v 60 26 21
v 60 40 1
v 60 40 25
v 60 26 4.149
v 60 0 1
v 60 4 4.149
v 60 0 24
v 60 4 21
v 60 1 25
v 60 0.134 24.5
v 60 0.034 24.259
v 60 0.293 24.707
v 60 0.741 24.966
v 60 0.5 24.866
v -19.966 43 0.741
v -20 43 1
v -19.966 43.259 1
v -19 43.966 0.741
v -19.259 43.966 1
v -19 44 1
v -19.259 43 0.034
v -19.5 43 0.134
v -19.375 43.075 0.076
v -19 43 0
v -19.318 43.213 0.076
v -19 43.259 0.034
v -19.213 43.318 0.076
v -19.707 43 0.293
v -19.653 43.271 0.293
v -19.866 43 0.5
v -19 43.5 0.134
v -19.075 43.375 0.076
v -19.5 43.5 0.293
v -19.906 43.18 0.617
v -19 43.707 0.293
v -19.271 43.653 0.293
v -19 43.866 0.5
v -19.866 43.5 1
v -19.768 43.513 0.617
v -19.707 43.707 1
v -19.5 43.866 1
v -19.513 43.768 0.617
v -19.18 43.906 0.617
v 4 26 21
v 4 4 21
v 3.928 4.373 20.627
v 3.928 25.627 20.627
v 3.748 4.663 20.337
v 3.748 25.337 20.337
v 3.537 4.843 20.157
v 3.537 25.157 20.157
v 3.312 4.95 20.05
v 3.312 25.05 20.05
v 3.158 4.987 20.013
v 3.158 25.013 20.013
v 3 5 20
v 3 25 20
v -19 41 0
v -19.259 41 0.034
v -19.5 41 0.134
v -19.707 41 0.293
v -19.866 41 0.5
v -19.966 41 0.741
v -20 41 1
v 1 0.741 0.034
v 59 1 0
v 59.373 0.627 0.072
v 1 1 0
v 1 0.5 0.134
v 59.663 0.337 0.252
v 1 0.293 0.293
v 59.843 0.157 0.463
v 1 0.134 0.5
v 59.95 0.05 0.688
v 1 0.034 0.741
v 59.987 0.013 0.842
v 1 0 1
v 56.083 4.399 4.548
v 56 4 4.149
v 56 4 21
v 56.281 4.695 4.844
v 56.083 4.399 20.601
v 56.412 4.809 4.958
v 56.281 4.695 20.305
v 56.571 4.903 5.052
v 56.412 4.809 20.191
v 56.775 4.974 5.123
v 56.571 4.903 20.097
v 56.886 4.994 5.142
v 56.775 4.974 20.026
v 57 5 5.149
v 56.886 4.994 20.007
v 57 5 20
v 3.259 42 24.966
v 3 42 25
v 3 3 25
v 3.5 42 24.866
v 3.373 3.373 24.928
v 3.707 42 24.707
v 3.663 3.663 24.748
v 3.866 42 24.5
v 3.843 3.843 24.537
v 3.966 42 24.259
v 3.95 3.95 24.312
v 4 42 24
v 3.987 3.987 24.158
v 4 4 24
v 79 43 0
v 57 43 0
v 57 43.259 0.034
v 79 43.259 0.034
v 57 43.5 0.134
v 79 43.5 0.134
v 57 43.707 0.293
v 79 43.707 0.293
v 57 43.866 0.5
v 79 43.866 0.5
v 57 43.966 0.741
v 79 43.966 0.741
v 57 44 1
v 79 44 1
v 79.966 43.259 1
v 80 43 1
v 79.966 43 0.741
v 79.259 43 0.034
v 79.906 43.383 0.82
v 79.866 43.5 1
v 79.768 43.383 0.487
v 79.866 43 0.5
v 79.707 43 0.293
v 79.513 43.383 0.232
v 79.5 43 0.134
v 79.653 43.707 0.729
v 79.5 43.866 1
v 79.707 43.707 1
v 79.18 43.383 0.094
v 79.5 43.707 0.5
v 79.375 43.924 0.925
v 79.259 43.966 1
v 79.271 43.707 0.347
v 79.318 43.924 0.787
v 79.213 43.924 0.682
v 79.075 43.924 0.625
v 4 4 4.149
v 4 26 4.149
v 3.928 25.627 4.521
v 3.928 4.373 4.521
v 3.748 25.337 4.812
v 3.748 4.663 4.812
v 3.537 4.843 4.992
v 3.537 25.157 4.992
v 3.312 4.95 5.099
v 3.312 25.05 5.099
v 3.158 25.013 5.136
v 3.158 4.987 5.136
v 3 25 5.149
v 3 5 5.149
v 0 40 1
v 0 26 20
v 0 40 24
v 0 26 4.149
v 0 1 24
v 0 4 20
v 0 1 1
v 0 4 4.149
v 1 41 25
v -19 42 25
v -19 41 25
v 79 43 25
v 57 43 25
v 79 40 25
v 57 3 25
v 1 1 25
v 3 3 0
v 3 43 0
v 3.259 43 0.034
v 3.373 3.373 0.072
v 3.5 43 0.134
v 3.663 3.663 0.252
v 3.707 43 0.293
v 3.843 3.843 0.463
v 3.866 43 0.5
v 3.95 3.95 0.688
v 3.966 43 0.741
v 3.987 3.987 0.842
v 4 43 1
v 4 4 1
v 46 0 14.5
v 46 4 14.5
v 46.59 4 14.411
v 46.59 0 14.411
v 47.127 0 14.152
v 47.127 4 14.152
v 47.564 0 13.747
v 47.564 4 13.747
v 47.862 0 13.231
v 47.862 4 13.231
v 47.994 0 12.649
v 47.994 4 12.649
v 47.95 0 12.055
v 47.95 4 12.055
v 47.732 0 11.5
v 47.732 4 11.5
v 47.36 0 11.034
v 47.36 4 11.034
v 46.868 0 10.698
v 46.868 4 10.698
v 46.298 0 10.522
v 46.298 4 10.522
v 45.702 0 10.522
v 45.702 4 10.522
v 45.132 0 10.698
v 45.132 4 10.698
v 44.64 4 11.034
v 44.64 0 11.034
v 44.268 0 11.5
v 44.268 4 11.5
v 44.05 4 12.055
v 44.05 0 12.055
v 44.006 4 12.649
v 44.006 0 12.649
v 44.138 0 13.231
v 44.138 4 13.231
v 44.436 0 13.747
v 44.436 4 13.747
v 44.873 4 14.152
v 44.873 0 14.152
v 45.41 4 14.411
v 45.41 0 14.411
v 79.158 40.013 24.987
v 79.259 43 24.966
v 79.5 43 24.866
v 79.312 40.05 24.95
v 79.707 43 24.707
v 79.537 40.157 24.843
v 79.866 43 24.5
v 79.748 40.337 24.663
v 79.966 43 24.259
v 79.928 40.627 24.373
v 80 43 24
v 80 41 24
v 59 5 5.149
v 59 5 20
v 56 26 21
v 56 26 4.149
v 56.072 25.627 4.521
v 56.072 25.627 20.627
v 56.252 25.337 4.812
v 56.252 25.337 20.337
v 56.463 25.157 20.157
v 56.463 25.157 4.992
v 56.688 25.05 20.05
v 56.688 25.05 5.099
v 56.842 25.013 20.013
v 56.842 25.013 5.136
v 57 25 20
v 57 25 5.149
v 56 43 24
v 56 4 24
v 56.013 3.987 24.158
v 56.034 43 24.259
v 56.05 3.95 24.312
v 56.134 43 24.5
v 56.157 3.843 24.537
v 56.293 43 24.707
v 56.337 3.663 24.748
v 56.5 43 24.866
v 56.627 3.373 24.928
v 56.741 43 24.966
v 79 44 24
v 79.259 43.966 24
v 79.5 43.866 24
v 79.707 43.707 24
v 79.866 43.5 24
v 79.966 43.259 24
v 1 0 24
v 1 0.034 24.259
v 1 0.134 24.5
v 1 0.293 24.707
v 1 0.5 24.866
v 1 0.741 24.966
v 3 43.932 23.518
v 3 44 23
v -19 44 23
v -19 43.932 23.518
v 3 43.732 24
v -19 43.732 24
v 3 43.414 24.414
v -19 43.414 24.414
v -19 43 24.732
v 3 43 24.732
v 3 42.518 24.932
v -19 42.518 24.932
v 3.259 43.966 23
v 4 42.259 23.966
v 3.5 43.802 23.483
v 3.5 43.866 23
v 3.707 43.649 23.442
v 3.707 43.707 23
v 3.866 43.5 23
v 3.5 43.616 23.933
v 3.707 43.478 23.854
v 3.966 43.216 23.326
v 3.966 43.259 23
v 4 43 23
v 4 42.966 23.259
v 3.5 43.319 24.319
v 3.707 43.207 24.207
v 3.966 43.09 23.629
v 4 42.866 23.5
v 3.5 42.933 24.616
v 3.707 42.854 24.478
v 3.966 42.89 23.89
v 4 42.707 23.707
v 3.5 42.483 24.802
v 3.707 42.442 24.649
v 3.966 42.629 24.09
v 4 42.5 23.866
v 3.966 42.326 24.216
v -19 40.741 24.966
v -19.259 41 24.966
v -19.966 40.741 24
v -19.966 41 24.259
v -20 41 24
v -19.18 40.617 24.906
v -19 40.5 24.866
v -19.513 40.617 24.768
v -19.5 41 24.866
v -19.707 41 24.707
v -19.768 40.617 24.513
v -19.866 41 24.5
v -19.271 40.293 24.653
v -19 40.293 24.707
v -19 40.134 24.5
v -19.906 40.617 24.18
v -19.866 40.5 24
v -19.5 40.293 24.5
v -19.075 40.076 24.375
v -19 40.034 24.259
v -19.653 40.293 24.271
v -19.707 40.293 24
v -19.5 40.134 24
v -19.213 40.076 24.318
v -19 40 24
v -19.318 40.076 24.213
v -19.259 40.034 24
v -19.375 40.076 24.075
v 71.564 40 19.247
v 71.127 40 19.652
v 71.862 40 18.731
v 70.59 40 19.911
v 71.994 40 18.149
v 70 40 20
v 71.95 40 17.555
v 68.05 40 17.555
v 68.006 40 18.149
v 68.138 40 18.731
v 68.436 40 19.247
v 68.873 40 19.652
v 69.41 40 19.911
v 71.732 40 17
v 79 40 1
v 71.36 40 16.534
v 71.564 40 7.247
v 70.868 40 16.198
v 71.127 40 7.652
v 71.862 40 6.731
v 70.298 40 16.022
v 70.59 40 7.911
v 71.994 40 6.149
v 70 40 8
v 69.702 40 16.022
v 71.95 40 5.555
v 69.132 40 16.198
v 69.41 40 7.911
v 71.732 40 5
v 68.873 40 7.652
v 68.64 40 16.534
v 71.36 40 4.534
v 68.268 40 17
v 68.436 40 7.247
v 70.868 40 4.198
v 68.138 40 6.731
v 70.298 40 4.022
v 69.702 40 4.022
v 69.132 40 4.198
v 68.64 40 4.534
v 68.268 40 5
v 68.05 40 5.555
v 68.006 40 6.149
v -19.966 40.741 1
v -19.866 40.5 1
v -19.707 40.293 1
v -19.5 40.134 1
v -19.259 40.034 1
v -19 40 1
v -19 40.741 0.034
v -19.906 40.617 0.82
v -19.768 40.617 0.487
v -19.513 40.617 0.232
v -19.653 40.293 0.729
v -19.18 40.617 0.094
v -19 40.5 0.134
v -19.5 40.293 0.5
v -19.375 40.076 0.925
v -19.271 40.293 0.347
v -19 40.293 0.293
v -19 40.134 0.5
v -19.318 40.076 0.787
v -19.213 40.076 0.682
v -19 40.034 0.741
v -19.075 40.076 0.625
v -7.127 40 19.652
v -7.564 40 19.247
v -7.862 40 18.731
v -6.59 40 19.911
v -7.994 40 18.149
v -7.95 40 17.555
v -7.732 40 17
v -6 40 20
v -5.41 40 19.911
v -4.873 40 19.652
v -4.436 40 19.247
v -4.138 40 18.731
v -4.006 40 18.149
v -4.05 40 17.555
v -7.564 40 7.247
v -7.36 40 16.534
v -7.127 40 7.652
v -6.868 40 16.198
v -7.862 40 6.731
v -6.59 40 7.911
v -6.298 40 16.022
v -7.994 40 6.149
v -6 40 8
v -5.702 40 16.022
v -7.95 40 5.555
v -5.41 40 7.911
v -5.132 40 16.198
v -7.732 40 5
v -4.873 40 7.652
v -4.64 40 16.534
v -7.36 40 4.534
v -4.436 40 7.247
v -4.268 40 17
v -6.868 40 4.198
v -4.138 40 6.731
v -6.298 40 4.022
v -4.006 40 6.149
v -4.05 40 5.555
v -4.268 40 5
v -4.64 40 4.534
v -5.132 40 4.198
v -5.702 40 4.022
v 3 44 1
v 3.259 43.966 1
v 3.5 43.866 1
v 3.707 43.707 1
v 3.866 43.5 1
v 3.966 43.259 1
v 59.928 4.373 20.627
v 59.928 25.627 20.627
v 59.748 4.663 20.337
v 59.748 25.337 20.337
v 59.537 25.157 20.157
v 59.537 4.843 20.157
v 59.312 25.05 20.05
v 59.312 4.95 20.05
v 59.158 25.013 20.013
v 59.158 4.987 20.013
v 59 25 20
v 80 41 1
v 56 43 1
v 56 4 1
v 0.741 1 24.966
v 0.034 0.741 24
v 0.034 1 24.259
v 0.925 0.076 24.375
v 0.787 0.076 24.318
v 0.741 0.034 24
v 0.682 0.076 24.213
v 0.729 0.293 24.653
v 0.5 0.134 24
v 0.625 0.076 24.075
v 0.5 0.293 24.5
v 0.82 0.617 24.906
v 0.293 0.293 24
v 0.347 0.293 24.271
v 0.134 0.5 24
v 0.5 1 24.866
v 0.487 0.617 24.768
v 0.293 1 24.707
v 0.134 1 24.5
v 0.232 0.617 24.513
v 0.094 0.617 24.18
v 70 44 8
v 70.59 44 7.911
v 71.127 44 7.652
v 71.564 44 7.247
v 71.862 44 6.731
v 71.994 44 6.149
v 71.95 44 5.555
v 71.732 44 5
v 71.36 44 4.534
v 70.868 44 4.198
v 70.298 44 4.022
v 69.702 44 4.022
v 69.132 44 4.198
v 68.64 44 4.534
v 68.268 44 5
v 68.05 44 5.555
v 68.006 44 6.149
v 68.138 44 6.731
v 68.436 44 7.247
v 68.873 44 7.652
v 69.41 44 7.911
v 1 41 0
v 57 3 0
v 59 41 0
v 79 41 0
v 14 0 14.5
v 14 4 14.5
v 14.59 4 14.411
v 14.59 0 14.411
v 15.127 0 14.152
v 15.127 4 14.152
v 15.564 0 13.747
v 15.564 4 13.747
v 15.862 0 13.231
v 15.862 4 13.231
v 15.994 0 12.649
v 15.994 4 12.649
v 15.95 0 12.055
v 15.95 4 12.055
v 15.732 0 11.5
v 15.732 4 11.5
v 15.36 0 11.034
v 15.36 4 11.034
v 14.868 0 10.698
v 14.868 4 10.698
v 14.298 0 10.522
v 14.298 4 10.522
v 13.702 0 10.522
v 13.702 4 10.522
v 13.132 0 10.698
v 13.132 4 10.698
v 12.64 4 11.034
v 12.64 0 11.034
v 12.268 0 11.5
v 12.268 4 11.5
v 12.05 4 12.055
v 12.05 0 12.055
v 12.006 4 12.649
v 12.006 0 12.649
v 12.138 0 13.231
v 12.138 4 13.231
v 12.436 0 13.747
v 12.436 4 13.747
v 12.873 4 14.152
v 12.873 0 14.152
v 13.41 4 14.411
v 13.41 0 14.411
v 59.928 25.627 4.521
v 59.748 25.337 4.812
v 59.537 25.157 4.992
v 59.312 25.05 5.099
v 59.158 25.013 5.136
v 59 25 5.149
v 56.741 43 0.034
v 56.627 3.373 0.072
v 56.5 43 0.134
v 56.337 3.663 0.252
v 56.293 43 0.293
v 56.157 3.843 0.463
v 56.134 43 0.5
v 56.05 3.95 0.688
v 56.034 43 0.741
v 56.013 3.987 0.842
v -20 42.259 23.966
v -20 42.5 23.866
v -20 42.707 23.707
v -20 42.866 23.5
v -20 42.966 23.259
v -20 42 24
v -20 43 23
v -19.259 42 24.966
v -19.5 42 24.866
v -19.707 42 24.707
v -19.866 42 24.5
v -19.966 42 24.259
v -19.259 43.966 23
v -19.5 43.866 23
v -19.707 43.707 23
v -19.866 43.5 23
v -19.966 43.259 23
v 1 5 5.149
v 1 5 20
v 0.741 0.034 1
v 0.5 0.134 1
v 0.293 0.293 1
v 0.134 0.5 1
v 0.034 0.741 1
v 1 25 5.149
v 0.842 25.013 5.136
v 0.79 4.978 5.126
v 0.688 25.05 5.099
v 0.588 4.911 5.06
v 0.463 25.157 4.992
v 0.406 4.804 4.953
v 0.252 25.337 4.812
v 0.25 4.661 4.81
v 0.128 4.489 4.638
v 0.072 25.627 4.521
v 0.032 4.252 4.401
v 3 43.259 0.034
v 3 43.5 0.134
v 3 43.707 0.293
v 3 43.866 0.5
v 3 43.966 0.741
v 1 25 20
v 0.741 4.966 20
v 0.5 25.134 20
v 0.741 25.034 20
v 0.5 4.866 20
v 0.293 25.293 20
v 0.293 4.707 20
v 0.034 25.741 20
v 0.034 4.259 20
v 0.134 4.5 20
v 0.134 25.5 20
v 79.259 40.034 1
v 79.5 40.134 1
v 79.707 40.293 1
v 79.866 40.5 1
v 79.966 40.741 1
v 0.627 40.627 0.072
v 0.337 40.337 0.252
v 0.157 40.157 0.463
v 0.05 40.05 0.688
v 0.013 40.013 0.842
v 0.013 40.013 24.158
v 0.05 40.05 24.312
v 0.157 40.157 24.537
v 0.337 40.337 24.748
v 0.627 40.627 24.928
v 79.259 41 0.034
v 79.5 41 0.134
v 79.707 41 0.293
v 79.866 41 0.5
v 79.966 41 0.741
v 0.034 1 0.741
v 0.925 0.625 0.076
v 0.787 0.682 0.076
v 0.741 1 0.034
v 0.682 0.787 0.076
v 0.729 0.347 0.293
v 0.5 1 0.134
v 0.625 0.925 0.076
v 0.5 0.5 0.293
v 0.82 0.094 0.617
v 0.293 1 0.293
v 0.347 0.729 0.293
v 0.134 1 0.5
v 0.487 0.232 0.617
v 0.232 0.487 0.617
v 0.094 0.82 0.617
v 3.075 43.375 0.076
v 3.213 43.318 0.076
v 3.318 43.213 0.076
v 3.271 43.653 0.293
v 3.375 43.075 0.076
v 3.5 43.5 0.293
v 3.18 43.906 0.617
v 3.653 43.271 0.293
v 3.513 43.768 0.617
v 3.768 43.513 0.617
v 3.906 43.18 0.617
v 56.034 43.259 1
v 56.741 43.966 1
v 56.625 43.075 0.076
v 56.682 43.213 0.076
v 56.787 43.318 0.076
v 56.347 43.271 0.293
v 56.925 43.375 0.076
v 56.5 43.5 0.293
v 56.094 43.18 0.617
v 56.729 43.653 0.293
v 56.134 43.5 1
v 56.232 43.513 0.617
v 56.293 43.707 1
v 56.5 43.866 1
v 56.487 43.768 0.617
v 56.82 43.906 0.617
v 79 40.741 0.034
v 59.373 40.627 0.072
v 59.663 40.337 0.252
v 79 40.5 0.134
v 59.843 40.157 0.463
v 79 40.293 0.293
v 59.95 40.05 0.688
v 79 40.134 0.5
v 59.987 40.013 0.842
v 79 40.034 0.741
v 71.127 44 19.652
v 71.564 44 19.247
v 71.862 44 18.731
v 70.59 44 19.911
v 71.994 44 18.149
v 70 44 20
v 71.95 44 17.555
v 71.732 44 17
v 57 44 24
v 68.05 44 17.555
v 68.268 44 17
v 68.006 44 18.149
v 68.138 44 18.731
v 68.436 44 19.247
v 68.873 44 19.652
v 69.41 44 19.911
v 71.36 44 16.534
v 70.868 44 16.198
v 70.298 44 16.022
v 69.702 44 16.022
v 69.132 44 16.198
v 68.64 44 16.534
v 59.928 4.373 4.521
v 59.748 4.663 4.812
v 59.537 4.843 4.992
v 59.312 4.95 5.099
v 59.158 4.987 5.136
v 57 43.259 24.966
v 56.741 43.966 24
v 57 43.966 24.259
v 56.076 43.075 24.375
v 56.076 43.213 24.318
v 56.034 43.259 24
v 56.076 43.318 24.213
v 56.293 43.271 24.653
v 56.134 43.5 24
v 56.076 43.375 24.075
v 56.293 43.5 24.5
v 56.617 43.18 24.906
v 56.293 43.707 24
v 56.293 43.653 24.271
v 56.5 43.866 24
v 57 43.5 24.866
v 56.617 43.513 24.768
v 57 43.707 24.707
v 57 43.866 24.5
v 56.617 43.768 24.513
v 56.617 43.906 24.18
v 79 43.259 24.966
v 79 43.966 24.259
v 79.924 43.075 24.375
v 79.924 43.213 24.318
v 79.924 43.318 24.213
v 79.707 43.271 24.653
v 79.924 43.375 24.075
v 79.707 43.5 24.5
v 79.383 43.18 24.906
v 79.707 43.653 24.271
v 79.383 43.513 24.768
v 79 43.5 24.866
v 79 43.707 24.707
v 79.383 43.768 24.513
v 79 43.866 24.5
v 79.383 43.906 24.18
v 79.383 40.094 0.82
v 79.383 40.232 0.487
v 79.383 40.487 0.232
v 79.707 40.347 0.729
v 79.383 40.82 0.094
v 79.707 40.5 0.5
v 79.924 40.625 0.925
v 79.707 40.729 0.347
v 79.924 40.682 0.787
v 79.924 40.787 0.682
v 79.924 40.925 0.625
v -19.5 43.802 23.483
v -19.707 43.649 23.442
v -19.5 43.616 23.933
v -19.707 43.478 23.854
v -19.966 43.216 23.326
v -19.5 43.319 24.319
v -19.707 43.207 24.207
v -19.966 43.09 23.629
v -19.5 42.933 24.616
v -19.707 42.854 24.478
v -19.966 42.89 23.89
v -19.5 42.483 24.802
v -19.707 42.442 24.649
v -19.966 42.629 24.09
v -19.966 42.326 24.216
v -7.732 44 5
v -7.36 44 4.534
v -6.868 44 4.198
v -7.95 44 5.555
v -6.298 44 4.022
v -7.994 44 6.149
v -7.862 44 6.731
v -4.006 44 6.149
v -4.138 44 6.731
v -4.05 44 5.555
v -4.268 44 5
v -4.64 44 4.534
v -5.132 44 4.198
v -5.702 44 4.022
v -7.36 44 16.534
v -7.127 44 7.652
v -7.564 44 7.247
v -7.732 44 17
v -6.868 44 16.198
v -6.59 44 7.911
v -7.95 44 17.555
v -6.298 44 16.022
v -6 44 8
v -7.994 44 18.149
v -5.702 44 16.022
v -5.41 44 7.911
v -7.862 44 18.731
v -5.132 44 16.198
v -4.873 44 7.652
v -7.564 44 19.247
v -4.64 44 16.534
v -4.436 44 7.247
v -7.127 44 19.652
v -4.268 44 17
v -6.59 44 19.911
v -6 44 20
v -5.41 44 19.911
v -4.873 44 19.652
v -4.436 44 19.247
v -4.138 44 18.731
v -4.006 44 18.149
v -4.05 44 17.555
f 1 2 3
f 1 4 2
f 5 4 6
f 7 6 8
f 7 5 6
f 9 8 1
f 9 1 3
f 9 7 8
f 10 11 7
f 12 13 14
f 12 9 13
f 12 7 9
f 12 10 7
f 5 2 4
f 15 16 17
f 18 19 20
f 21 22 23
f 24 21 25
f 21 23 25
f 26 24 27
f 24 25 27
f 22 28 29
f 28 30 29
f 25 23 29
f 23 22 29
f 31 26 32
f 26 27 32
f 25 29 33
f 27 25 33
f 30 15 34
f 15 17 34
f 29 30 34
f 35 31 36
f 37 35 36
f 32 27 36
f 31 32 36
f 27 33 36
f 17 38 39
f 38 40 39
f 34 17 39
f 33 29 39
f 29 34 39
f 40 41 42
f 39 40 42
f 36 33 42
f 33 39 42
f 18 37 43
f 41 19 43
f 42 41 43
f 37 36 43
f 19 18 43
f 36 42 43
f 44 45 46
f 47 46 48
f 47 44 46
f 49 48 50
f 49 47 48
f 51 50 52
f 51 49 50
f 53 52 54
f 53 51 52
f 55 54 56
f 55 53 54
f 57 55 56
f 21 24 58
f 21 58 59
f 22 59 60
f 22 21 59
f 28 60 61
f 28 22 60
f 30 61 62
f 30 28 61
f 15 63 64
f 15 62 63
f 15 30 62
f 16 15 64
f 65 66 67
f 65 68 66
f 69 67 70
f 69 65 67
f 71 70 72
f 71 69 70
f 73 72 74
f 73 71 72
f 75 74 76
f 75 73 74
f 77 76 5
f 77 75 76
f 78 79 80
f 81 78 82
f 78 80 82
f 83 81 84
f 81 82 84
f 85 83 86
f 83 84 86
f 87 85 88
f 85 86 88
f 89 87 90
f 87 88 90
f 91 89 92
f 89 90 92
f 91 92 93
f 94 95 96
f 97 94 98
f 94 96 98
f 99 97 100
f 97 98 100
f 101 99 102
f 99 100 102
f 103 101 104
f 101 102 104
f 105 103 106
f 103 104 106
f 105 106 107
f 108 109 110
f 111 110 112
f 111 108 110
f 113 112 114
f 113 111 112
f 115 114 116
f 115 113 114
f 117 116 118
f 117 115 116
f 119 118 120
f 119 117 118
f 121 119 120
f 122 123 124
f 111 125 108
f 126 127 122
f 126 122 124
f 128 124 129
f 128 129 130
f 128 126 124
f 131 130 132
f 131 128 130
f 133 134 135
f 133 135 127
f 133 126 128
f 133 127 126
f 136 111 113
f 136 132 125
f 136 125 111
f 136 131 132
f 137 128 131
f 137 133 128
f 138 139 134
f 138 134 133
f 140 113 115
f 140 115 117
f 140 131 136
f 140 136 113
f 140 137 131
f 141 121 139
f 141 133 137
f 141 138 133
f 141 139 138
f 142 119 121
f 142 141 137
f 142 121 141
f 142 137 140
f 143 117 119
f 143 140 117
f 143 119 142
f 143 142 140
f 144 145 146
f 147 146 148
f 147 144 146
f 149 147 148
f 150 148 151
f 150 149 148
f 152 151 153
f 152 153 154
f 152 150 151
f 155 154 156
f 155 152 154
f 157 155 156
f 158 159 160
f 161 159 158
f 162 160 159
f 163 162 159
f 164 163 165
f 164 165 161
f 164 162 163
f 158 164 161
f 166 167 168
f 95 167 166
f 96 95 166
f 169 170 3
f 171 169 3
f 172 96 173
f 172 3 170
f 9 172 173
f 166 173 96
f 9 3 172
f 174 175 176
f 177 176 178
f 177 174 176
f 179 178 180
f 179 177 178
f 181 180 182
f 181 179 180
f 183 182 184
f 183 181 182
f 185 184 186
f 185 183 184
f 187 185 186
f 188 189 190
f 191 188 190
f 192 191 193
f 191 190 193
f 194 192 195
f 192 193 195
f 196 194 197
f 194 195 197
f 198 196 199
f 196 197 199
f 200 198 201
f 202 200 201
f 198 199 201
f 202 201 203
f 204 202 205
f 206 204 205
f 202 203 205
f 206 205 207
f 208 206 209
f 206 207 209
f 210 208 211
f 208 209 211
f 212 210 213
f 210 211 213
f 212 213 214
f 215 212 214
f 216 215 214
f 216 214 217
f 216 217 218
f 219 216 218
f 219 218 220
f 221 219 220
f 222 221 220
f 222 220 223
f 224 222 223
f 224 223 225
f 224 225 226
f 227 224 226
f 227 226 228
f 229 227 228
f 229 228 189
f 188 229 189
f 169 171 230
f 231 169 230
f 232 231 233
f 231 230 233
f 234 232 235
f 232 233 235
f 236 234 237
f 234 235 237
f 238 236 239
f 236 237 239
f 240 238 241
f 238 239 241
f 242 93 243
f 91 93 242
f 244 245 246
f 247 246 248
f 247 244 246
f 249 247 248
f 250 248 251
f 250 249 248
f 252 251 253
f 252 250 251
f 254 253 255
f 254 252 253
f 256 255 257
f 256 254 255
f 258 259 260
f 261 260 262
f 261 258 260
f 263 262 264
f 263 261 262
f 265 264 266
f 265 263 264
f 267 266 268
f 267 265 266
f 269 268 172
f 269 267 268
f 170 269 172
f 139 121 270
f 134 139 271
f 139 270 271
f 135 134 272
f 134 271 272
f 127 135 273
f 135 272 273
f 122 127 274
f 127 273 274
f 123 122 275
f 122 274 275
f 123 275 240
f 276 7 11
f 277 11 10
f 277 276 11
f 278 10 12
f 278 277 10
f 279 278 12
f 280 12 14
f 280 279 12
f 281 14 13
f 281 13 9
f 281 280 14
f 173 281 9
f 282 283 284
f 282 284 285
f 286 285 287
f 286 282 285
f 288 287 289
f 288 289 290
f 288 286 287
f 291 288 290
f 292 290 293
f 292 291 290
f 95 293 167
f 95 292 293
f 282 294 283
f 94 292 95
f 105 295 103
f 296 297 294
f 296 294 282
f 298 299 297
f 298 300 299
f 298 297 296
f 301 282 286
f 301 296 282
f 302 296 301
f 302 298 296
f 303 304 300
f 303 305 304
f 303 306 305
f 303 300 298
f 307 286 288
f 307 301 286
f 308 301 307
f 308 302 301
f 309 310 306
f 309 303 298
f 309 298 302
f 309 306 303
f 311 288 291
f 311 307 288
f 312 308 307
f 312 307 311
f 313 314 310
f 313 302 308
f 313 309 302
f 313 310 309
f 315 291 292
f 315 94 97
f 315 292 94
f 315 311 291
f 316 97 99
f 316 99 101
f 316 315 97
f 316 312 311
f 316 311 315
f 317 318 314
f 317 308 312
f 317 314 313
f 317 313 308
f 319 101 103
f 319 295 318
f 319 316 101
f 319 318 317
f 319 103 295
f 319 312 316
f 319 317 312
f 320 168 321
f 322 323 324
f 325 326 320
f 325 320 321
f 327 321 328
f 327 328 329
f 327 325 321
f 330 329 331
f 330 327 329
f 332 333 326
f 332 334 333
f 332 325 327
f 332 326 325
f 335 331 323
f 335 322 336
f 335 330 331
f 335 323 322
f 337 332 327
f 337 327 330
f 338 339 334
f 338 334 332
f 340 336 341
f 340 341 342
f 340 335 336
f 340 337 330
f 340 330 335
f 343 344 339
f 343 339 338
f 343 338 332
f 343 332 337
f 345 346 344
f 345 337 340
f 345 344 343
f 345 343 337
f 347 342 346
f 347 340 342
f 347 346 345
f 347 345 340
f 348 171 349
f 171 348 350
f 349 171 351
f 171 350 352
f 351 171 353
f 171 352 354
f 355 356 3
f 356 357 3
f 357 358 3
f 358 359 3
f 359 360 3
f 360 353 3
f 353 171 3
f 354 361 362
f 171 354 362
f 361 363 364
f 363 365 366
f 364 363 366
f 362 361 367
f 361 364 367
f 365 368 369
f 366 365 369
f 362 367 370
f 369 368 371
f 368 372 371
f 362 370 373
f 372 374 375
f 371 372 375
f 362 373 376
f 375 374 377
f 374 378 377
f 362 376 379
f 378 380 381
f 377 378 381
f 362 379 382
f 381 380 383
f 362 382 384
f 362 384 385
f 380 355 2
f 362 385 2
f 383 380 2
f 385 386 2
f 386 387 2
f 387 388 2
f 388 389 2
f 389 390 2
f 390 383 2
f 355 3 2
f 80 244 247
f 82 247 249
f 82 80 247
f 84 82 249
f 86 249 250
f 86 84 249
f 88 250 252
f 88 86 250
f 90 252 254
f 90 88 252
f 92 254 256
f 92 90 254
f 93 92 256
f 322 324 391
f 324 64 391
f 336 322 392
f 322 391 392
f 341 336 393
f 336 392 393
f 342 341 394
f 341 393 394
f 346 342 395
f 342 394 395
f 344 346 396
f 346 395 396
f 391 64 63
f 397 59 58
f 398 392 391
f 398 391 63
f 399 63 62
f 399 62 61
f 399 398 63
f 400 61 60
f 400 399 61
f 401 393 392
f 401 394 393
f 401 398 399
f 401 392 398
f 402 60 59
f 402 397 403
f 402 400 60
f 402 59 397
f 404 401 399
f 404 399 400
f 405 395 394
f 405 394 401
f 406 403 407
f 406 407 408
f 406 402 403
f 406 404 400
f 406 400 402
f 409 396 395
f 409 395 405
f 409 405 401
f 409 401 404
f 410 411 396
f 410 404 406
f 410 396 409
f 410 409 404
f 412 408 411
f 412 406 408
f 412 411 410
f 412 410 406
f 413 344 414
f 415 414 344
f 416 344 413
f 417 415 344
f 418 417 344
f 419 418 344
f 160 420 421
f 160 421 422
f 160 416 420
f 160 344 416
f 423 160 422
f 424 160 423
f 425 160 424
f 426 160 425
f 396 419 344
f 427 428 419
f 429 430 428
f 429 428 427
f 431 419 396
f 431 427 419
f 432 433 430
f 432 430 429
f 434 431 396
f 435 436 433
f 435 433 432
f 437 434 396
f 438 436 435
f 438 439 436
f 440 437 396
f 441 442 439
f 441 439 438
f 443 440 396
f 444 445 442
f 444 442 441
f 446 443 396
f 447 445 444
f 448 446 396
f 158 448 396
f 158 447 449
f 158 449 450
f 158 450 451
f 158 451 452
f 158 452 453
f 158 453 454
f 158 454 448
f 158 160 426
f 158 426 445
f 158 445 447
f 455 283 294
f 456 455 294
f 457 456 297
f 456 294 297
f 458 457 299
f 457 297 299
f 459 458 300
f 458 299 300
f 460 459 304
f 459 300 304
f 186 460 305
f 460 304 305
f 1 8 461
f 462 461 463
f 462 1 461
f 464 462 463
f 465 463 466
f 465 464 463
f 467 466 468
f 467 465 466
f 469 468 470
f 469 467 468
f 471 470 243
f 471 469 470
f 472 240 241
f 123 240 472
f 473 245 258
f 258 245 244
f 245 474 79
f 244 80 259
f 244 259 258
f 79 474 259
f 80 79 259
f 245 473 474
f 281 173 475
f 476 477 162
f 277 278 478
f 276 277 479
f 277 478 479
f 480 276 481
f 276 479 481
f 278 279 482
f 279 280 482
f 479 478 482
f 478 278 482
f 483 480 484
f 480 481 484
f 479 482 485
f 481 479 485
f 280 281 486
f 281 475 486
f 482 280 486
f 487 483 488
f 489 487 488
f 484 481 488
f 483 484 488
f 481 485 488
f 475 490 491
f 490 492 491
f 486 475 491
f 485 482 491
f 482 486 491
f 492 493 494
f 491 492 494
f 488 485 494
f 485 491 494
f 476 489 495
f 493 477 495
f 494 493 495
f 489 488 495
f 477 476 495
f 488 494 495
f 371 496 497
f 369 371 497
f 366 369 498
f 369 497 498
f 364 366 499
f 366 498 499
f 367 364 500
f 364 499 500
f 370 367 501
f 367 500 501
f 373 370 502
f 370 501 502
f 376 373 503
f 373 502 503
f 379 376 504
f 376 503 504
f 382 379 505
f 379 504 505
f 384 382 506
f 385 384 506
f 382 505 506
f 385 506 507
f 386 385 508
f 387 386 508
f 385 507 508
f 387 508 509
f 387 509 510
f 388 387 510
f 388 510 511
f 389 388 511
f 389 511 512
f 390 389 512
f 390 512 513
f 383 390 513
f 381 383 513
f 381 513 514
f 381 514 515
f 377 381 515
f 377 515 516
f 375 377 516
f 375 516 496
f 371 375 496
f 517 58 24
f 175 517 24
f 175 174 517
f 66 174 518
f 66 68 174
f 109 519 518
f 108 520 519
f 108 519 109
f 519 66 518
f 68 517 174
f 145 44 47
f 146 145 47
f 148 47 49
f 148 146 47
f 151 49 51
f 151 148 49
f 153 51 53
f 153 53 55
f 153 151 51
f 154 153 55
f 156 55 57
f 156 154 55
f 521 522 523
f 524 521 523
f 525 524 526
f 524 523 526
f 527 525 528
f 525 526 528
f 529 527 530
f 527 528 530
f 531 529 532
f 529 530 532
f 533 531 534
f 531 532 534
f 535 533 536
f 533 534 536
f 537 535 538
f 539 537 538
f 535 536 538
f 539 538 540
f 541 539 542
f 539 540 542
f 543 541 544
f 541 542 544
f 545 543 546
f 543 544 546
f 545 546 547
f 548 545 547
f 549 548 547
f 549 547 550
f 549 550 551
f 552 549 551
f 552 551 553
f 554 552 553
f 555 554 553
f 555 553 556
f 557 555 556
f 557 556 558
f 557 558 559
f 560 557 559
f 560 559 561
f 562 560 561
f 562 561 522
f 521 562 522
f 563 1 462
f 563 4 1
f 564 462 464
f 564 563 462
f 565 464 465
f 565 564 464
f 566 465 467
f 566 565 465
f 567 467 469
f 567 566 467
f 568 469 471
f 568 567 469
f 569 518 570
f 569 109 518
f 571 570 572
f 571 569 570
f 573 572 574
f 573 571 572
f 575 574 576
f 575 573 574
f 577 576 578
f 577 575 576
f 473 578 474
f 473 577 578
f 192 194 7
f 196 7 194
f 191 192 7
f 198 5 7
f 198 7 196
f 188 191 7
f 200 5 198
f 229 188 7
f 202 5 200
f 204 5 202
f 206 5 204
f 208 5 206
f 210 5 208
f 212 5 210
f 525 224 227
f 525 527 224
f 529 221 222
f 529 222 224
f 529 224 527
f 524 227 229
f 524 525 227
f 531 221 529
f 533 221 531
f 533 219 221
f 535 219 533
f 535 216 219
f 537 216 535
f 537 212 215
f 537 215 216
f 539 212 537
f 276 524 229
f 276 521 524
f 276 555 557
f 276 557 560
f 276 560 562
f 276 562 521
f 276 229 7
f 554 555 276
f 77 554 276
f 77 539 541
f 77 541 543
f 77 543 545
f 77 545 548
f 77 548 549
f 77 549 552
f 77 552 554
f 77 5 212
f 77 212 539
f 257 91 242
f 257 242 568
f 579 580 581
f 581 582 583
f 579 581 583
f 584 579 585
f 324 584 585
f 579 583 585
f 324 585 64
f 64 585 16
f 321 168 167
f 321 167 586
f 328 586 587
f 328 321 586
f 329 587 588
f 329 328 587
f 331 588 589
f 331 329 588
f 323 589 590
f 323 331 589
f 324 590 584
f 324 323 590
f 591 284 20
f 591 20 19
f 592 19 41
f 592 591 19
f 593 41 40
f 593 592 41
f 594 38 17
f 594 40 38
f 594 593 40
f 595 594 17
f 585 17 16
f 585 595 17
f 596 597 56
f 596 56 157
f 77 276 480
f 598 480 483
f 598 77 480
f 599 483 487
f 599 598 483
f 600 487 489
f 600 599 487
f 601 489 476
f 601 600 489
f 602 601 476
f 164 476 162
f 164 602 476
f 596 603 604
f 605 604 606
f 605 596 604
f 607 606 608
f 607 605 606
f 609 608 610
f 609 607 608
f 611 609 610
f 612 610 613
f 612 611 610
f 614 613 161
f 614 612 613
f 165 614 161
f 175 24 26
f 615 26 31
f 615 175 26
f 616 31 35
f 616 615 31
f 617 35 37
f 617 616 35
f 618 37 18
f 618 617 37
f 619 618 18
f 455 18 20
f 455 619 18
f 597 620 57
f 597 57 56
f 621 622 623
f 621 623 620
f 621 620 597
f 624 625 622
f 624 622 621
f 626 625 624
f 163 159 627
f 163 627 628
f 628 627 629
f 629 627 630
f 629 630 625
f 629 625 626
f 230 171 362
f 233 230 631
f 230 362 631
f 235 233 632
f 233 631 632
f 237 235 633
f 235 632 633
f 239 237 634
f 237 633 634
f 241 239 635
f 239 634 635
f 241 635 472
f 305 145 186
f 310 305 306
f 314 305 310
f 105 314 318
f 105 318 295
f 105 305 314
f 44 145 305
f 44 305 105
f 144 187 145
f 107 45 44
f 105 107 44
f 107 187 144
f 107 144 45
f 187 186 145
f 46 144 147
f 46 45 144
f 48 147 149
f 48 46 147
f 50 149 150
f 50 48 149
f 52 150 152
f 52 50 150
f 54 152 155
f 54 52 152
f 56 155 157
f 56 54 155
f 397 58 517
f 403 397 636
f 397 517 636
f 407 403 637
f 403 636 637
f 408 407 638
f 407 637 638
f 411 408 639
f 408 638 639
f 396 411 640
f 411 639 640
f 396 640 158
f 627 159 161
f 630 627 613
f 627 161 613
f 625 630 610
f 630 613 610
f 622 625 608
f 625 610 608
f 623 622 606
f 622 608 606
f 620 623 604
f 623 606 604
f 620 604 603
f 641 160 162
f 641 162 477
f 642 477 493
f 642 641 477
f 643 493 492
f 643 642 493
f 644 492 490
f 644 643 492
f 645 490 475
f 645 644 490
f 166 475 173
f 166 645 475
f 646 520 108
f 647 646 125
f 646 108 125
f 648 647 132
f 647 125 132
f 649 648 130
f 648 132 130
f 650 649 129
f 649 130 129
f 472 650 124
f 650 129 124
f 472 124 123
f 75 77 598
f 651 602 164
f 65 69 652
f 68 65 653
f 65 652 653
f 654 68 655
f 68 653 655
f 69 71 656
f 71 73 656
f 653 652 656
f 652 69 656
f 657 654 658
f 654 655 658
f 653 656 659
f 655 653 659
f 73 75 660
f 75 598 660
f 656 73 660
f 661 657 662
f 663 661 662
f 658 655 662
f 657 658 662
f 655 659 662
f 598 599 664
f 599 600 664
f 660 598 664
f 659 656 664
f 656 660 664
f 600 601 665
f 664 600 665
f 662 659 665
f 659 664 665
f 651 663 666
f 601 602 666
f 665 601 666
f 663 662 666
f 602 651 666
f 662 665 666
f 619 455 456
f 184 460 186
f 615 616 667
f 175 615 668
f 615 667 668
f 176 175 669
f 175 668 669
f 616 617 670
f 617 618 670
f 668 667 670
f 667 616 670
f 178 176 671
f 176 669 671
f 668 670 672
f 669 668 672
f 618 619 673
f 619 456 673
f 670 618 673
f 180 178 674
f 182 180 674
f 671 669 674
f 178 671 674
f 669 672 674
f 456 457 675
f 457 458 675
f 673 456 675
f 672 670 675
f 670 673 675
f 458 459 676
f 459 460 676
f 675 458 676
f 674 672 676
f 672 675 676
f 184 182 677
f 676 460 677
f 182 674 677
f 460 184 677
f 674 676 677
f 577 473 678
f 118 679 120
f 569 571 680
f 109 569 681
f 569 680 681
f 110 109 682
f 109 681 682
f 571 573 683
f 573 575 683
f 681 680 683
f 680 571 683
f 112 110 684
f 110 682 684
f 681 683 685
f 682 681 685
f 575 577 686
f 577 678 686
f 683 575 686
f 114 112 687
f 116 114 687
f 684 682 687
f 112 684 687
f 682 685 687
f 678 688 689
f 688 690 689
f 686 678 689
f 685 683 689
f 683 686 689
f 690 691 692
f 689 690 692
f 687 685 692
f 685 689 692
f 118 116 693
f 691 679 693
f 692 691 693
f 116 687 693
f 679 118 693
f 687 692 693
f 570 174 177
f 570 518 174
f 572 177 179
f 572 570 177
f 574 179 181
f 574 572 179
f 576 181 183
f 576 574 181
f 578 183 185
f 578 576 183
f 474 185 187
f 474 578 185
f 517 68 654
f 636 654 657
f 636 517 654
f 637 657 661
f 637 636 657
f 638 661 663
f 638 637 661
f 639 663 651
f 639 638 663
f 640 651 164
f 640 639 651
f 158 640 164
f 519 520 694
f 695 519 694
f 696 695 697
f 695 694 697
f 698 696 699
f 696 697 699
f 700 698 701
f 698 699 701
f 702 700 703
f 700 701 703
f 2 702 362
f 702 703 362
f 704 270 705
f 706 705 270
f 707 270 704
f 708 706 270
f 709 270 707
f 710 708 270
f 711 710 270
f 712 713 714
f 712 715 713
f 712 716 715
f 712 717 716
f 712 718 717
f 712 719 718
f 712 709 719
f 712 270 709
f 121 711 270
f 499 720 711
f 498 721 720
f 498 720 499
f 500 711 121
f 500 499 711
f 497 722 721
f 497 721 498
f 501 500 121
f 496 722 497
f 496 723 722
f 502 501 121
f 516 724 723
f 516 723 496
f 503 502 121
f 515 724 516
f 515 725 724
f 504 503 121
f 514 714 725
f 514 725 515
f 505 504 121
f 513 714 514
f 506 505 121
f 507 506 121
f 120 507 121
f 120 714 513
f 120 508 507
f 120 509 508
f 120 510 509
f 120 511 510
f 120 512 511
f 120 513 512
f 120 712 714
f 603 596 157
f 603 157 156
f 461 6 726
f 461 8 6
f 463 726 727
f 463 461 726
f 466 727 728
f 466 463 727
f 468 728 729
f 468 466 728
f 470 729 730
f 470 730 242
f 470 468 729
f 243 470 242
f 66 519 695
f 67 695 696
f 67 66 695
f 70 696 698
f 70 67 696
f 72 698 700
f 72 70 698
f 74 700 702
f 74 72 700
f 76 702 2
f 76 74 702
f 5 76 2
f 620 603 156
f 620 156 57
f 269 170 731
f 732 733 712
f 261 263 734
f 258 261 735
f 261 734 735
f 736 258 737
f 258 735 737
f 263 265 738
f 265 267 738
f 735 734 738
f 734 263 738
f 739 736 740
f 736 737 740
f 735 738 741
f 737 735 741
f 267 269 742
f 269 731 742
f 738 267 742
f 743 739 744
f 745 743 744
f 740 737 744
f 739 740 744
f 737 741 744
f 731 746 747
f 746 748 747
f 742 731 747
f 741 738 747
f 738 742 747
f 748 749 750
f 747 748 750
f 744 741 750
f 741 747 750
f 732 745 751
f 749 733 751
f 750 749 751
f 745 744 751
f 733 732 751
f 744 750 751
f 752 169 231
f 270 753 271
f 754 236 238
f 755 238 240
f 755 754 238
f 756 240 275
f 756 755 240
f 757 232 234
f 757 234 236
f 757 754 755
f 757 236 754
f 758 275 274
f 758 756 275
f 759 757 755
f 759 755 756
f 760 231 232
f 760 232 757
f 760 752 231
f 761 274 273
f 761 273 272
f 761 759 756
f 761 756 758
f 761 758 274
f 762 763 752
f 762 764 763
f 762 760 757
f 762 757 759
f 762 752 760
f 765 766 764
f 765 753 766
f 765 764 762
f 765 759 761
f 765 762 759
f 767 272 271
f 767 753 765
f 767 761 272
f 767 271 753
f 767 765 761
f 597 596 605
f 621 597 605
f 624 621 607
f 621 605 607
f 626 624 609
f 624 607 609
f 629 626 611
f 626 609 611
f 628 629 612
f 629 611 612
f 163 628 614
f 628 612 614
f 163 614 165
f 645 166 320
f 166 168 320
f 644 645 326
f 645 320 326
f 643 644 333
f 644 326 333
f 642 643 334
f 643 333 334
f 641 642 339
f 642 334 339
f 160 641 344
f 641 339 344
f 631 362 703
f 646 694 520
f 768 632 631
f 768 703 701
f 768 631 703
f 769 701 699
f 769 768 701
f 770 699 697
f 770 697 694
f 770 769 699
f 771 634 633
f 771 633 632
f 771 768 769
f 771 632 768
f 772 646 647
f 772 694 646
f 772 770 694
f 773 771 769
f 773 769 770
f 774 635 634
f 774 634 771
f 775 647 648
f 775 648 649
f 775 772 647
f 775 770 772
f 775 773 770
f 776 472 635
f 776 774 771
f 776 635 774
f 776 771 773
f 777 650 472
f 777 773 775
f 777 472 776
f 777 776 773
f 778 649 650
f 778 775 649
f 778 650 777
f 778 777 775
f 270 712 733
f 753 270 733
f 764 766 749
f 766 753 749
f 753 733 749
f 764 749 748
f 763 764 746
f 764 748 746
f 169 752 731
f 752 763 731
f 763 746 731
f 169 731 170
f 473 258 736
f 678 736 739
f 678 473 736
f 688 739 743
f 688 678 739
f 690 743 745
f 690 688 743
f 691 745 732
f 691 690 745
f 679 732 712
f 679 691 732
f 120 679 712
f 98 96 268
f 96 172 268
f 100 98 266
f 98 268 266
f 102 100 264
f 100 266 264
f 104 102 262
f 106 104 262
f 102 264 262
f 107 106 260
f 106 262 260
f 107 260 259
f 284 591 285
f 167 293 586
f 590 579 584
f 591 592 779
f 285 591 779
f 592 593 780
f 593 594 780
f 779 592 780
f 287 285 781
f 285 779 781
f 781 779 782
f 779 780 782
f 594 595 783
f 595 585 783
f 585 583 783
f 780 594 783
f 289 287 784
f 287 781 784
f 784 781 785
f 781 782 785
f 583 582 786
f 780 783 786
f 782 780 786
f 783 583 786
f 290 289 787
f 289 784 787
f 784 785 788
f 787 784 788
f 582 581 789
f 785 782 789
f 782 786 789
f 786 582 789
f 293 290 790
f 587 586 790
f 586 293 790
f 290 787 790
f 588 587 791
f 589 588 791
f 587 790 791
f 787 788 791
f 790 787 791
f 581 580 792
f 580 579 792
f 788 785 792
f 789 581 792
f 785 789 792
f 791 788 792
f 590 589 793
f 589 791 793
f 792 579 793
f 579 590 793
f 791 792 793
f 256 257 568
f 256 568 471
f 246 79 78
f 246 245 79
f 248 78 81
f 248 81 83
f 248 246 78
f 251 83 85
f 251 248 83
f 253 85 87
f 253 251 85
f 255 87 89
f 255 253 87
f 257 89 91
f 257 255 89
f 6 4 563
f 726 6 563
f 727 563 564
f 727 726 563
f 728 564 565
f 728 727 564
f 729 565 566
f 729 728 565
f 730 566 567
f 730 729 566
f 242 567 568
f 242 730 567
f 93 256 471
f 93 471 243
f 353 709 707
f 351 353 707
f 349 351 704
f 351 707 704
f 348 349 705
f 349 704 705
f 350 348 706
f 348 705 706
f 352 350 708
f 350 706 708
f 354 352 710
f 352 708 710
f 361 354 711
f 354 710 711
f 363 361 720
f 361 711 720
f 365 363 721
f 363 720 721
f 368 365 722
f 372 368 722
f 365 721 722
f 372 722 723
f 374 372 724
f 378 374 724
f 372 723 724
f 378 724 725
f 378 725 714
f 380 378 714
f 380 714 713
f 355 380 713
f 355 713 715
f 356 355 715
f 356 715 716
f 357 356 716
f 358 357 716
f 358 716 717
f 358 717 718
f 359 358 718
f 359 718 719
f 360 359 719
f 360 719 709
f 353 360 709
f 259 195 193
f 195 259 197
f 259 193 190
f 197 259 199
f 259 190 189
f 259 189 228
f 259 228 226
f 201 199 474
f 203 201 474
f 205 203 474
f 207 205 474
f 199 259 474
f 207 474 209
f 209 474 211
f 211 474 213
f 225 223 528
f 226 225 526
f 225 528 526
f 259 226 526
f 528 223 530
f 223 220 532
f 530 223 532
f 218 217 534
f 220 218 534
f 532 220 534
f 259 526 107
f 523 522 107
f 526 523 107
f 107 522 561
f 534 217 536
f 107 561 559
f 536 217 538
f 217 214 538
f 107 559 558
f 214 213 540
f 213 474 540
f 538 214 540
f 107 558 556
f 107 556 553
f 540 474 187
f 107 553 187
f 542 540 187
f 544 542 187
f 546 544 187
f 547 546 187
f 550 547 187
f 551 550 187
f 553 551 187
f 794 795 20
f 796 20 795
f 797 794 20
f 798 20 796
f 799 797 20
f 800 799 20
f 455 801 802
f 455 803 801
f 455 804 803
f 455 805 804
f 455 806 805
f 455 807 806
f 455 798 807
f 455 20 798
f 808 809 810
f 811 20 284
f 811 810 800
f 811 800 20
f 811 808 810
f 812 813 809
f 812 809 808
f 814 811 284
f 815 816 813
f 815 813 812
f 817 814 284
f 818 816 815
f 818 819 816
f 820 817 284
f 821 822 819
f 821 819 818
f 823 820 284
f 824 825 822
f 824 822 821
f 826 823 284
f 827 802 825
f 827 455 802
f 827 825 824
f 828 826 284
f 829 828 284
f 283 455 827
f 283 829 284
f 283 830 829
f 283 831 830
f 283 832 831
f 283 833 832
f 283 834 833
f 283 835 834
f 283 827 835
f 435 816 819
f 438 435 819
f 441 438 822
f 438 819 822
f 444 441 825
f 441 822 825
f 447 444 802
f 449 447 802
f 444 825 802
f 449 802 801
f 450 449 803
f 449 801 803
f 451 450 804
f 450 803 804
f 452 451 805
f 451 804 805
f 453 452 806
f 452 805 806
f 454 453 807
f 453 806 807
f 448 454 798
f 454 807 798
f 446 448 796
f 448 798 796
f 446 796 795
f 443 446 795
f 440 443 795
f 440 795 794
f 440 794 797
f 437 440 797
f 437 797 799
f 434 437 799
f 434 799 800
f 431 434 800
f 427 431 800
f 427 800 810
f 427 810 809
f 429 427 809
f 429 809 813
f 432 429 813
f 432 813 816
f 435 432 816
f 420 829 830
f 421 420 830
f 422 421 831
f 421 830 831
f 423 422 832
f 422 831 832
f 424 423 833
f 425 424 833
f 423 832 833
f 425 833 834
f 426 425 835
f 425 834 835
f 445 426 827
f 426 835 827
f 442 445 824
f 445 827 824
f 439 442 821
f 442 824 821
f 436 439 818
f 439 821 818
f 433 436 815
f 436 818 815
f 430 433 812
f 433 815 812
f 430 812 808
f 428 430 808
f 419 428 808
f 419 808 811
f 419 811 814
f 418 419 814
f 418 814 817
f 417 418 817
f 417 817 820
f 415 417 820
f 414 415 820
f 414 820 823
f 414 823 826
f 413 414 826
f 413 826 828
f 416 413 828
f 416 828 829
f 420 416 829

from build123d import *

# Parameters (mm, degrees)
BOSS_EXTRUDE1_DEPTH = 4
BOSS_EXTRUDE2_DEPTH = 40
SKETCH3_W           = 25
SKETCH3_H           = 4.000000000000007
BOSS_EXTRUDE3_DEPTH = 20
BOSS_EXTRUDE4_DEPTH = 20
SKETCH5_R           = 2.0000000000000004
SKETCH5_R_2         = 2.0000000000000018
SKETCH5_R_3         = 1.9999999999999967
CUT_EXTRUDE1_DEPTH  = 20
CUT_EXTRUDE3_DEPTH  = 75.00000000000004
SKETCH11_R          = 2.0000000000000027
CUT_EXTRUDE4_DEPTH  = 75.00000000000004
FILLET1_R           = 2
FILLET2_R           = 1
FILLET3_R           = 1
FILLET4_R           = 1
FILLET5_R           = 1
FILLET6_R           = 1
FILLET7_R           = 1
FILLET8_R           = 1
FILLET9_R           = 1
FILLET10_R          = 1
FILLET11_R          = 1
FILLET12_R          = 1
FILLET13_R          = 1
FILLET14_R          = 1
FILLET15_R          = 1
FILLET16_R          = 1
FILLET17_R          = 1
FILLET18_R          = 1
FILLET19_R          = 1
FILLET20_R          = 1
FILLET21_R          = 1


# Some blends are built 0.0001 mm under size
with BuildPart() as part:
    # Sketch1 → Boss-Extrude1 (new body)
    with BuildSketch(Plane(origin=(0, 0, 0), x_dir=(1, 0, 0), z_dir=(0, 1, 0))):
        Polygon((0, 0), (60, 0), (60.00000000000001, -25), (6.94e-15, -25), align=None)
    extrude(amount=BOSS_EXTRUDE1_DEPTH)

    # Sketch2 → Boss-Extrude2 (add)
    with BuildSketch(Plane(origin=(0, 4, 0), x_dir=(1, 0, 0), z_dir=(0, 1, 0))):
        Polygon((0, 0), (4, 0), (4.0000000000000036, -25), (0, -25), align=None)
        Polygon((60, 0), (55.99999999999999, -4.9e-16), (55.99999999999999, -25), (60, -25), align=None)
    extrude(amount=BOSS_EXTRUDE2_DEPTH)

    # Sketch3 → Boss-Extrude3 (add)
    with BuildSketch(Plane(origin=(60, 0, -1.665e-14), x_dir=(-2.8e-16, 0, -1), z_dir=(1, 0, -2.8e-16))):
        with Locations((-12.500000000000018, 42)):
            Rectangle(SKETCH3_W, SKETCH3_H)
    extrude(amount=BOSS_EXTRUDE3_DEPTH)

    # Sketch4 → Boss-Extrude4 (add)
    with BuildSketch(Plane.ZY):
        Polygon((0, 44), (25, 44), (25, 39.99999999999999), (4.9e-16, 39.99999999999999), align=None)
    extrude(amount=BOSS_EXTRUDE4_DEPTH)

    # Sketch5 → Cut-Extrude1 (cut)
    with BuildSketch(Plane(origin=(0, 44, 0), x_dir=(1, 0, 0), z_dir=(0, 1, 0))):
        with Locations(Location((-5.999999999999995, -6.000000000000008, 0), (0, 0, 270))):
            Circle(SKETCH5_R)
        with Locations(Location((-5.9999999999999964, -18.00000000000001, 0), (0, 0, 270))):
            Circle(SKETCH5_R_2)
        with Locations(Location((69.99999999999999, -6.000000000000002, 0), (0, 0, 270))):
            Circle(SKETCH5_R_3)
        with Locations(Location((70, -18.000000000000004, 0), (0, 0, 270))):
            Circle(SKETCH5_R_3)
    extrude(amount=-CUT_EXTRUDE1_DEPTH, mode=Mode.SUBTRACT)

    # Sketch10 → Cut-Extrude3 (cut)
    with BuildSketch(Plane.ZY):
        Polygon((5.148891761902153, 25), (20, 25.000000000000004), (20.000000000000004, 5.0000000000000036), (5.148891761902154, 5.000000000000001), align=None)
    extrude(amount=-CUT_EXTRUDE3_DEPTH, mode=Mode.SUBTRACT)

    # Sketch11 → Cut-Extrude4 (cut)
    with BuildSketch(Plane(origin=(0, 4, 0), x_dir=(1, 0, 0), z_dir=(0, 1, 0))):
        with Locations(Location((14.000000000000005, -12.5, 0), (0, 0, 270))):
            Circle(SKETCH11_R)
        with Locations(Location((45.99999999999999, -12.5, 0), (0, 0, 270))):
            Circle(SKETCH11_R)
    extrude(amount=-CUT_EXTRUDE4_DEPTH, mode=Mode.SUBTRACT)

    # Fillet1
    fillet1_edges = [part.edges().sort_by_distance(p)[0] for p in [
        (-7.999999999999995, 44, 25.000000000000004),
    ]]
    fillet(fillet1_edges, radius=FILLET1_R)

    # Fillet2
    fillet2_edges = [part.edges().sort_by_distance(p)[0] for p in [
        (-19.999999999999996, 44, 11.500000000000002),
        (4.000000000000002, 44, 11.499999999999996),
        (4.0000000000000036, 23, 25),
        (4.0000000000000036, 43.41421356237309, 24.41421356237309),
        (-19.999999999999993, 43.41421356237309, 24.414213562373096),
        (-19.999999999999993, 41, 25.000000000000007),
    ]]
    fillet(fillet2_edges, radius=FILLET2_R)

    # Fillet3
    fillet3_edges = [part.edges().sort_by_distance(p)[0] for p in [
        (68, 44, 25),
    ]]
    fillet(fillet3_edges, radius=FILLET3_R)

    # Fillet4
    fillet4_edges = [part.edges().sort_by_distance(p)[0] for p in [
        (55.99999999999999, 23.5, 25),
        (55.99999999999999, 43.707106781186546, 24.707106781186546),
        (55.99999999999999, 44, 12),
    ]]
    fillet(fillet4_edges, radius=FILLET4_R)

    # Fillet5
    fillet5_edges = [part.edges().sort_by_distance(p)[0] for p in [
        (30, 4, 25),
    ]]
    fillet(fillet5_edges, radius=FILLET5_R)

    # Fillet6
    fillet6_edges = [part.edges().sort_by_distance(p)[0] for p in [
        (3.49e-15, 5.000000000000002, 12.574445880951078),
    ]]
    fillet(fillet6_edges, radius=FILLET6_R)

    # Fillet7
    fillet7_edges = [part.edges().sort_by_distance(p)[0] for p in [
        (1.32e-15, 14.5, 5.148891761902153),
    ]]
    fillet(fillet7_edges, radius=FILLET7_R)

    # Fillet8
    fillet8_edges = [part.edges().sort_by_distance(p)[0] for p in [
        (3.33e-15, 25, 12.074445880951076),
    ]]
    fillet(fillet8_edges, radius=FILLET8_R)

    # Fillet9
    fillet9_edges = [part.edges().sort_by_distance(p)[0] for p in [
        (3.78e-15, 19.999999999999996, 25),
    ]]
    fillet(fillet9_edges, radius=FILLET9_R)

    # Fillet10
    fillet10_edges = [part.edges().sort_by_distance(p)[0] for p in [
        (55.99999999999999, 5.000000000000003, 12.574445880951062),
    ]]
    fillet(fillet10_edges, radius=FILLET10_R - 0.0001)  # a hair under: the kernel refuses the full size

    # Fillet11
    fillet11_edges = [part.edges().sort_by_distance(p)[0] for p in [
        (55.99999999999999, 14.500050000000002, 5.148891761902138),
    ]]
    fillet(fillet11_edges, radius=FILLET11_R)

    # Fillet12
    fillet12_edges = [part.edges().sort_by_distance(p)[0] for p in [
        (55.99999999999999, 25, 12.074445880951062),
    ]]
    fillet(fillet12_edges, radius=FILLET12_R)

    # Fillet13
    fillet13_edges = [part.edges().sort_by_distance(p)[0] for p in [
        (55.99999999999999, 15.000050000000003, 19.999999999999986),
    ]]
    fillet(fillet13_edges, radius=FILLET13_R)

    # Fillet14
    fillet14_edges = [part.edges().sort_by_distance(p)[0] for p in [
        (30.500000000000007, 0, 25),
        (0.2928932188134594, -1.1e-16, 24.707106781186546),
        (3.33e-15, 0, 12),
    ]]
    fillet(fillet14_edges, radius=FILLET14_R)

    # Fillet15
    fillet15_edges = [part.edges().sort_by_distance(p)[0] for p in [
        (29.999999999999996, 4, 0),
    ]]
    fillet(fillet15_edges, radius=FILLET15_R)

    # Fillet16
    fillet16_edges = [part.edges().sort_by_distance(p)[0] for p in [
        (0, 20.499999999999996, 0),
        (0.2928932188134523, 0.2928932188134522, 2e-16),
        (56.29289321881345, 43.707106781186546, 0),
        (30.5, 0, 0),
        (60, 19.999999999999996, 0),
        (80, 42, -5.55e-15),
        (70, 39.99999999999999, -2.78e-15),
        (68.5, 44, -2.66e-15),
        (55.99999999999999, 23, -1.1e-16),
    ]]
    fillet(fillet16_edges, radius=FILLET16_R)

    # Fillet17
    fillet17_edges = [part.edges().sort_by_distance(p)[0] for p in [
        (3.7071067811865475, 43.707106781186546, -1e-16),
        (-20, 41.5, 5.86e-15),
        (-19.707106781186546, 43.707106781186546, 2e-16),
        (4, 23, -1.1e-16),
        (-8, 44, 2.78e-15),
    ]]
    fillet(fillet17_edges, radius=FILLET17_R)

    # Fillet18
    fillet18_edges = [part.edges().sort_by_distance(p)[0] for p in [
        (-8.999999999999996, 39.99999999999999, 25),
        (-19.70710678118654, 39.99999999999999, 24.707106781186546),
        (-19.999999999999996, 39.99999999999999, 12.499999999999998),
        (-19.707106781186546, 39.99999999999999, 0.29289321881345254),
        (-9, 39.99999999999999, 2.99e-15),
    ]]
    fillet(fillet18_edges, radius=FILLET18_R)

    # Fillet19
    # the kernel refuses this fillet: 1 mm, written as the material it takes off along each edge
    with BuildSketch(Plane(origin=(79, 43, 1), x_dir=(1, 0, -2.8e-16), z_dir=(0, 1, 0))) as fillet19_piece_1_section:
        Polygon((0, 0), (FILLET19_R * 1.02, 0), (FILLET19_R * 1.02, FILLET19_R * 1.02), (2.8e-16, FILLET19_R * 1.02), align=None)
    fillet19_piece_1 = extrude(amount=FILLET19_R * 1.02, mode=Mode.PRIVATE)
    fillet19_piece_1 = fillet19_piece_1 - Plane(origin=(79, 43, 1), x_dir=(-0.7071067811865475, 0, 0.7071067811865477), z_dir=(0, 1, 0)) * Sphere(FILLET19_R, mode=Mode.PRIVATE)
    add(fillet19_piece_1, mode=Mode.SUBTRACT)
    with BuildSketch(Plane(origin=(79, 40.99999999999999, 1.0000000000000002), x_dir=(0, -1, 0), z_dir=(1, 0, -2.8e-16))) as fillet19_piece_2_section:
        Polygon((0, 0), (FILLET19_R * 1.02, 0), (FILLET19_R * 1.02, FILLET19_R * 1.02), (0, FILLET19_R * 1.02), align=None)
    fillet19_piece_2 = extrude(amount=FILLET19_R * 1.02, mode=Mode.PRIVATE)
    fillet19_piece_2 = fillet19_piece_2 - Plane(origin=(79, 40.99999999999999, 1.0000000000000002), x_dir=(0, 0.7071067811865475, 0.7071067811865475), z_dir=(1, 0, -2.8e-16)) * Sphere(FILLET19_R, mode=Mode.PRIVATE)
    add(fillet19_piece_2, mode=Mode.SUBTRACT)
    with BuildSketch(Plane(origin=(80, 37.49999999999999, 25), x_dir=(-1, 0, 0), z_dir=(0, 1, 0))) as fillet19_piece_3:
        with BuildLine():
            CenterArc((FILLET19_R, -FILLET19_R), FILLET19_R, 90, 90)
            Line((0, -FILLET19_R), (0, 0))
            Line((0, 0), (FILLET19_R, 0))
        make_face()
    extrude(amount=5.500000000000007, mode=Mode.SUBTRACT)
    with BuildSketch(Plane(origin=(80, 43, 23.999999999999996), x_dir=(0, 0, 1), z_dir=(0, -1, 0))) as fillet19_piece_4:
        with BuildLine():
            CenterArc((1 - FILLET19_R, FILLET19_R), FILLET19_R, 270, 90)
            Line((1 - FILLET19_R, 0), (1, 0))
            Line((1, 0), (1, FILLET19_R))
        make_face()
    revolve(axis=Axis((80, 43, 23.999999999999996), (-1, 0, 1.5e-16)), revolution_arc=90, mode=Mode.SUBTRACT)
    with BuildSketch(Plane(origin=(80, 44, 23.999999999999996), x_dir=(-1, 0, 2.8e-16), z_dir=(-2.8e-16, 0, -1))) as fillet19_piece_5:
        with BuildLine():
            CenterArc((FILLET19_R, -FILLET19_R), FILLET19_R, 90, 90)
            Line((0, -FILLET19_R), (0, 0))
            Line((0, 0), (FILLET19_R, 0))
        make_face()
    extrude(amount=22.999999999999996, mode=Mode.SUBTRACT)
    with BuildSketch(Plane(origin=(80, 39.99999999999999, 0.9999999999999998), x_dir=(0, 1, 0), z_dir=(2.8e-16, 0, 1))) as fillet19_piece_6:
        with BuildLine():
            CenterArc((FILLET19_R, FILLET19_R), FILLET19_R, 180, 90)
            Line((0, FILLET19_R), (0, 0))
            Line((0, 0), (FILLET19_R, 0))
        make_face()
    extrude(amount=26.499999999999996, mode=Mode.SUBTRACT)

    # Fillet20
    fillet20_edges = [part.edges().sort_by_distance(p)[0] for p in [
        (60, 15, 5.148891761902136),
        (60, 25.000000000000004, 12.57444588095106),
        (60.00000000000001, 15.000000000000004, 19.999999999999986),
        (60, 5.000000000000003, 12.574445880951062),
    ]]
    fillet(fillet20_edges, radius=FILLET20_R)

    # Fillet21
    fillet21_edges = [part.edges().sort_by_distance(p)[0] for p in [
        (4.000000000000001, 15, 5.148891761902152),
        (4.000000000000002, 25.000000000000004, 12.574445880951075),
        (4.000000000000003, 15.000000000000004, 20),
        (4.000000000000002, 5.000000000000003, 12.574445880951076),
    ]]
    fillet(fillet21_edges, radius=FILLET21_R - 0.0001)  # a hair under: the kernel refuses the full size


solid = part.part
